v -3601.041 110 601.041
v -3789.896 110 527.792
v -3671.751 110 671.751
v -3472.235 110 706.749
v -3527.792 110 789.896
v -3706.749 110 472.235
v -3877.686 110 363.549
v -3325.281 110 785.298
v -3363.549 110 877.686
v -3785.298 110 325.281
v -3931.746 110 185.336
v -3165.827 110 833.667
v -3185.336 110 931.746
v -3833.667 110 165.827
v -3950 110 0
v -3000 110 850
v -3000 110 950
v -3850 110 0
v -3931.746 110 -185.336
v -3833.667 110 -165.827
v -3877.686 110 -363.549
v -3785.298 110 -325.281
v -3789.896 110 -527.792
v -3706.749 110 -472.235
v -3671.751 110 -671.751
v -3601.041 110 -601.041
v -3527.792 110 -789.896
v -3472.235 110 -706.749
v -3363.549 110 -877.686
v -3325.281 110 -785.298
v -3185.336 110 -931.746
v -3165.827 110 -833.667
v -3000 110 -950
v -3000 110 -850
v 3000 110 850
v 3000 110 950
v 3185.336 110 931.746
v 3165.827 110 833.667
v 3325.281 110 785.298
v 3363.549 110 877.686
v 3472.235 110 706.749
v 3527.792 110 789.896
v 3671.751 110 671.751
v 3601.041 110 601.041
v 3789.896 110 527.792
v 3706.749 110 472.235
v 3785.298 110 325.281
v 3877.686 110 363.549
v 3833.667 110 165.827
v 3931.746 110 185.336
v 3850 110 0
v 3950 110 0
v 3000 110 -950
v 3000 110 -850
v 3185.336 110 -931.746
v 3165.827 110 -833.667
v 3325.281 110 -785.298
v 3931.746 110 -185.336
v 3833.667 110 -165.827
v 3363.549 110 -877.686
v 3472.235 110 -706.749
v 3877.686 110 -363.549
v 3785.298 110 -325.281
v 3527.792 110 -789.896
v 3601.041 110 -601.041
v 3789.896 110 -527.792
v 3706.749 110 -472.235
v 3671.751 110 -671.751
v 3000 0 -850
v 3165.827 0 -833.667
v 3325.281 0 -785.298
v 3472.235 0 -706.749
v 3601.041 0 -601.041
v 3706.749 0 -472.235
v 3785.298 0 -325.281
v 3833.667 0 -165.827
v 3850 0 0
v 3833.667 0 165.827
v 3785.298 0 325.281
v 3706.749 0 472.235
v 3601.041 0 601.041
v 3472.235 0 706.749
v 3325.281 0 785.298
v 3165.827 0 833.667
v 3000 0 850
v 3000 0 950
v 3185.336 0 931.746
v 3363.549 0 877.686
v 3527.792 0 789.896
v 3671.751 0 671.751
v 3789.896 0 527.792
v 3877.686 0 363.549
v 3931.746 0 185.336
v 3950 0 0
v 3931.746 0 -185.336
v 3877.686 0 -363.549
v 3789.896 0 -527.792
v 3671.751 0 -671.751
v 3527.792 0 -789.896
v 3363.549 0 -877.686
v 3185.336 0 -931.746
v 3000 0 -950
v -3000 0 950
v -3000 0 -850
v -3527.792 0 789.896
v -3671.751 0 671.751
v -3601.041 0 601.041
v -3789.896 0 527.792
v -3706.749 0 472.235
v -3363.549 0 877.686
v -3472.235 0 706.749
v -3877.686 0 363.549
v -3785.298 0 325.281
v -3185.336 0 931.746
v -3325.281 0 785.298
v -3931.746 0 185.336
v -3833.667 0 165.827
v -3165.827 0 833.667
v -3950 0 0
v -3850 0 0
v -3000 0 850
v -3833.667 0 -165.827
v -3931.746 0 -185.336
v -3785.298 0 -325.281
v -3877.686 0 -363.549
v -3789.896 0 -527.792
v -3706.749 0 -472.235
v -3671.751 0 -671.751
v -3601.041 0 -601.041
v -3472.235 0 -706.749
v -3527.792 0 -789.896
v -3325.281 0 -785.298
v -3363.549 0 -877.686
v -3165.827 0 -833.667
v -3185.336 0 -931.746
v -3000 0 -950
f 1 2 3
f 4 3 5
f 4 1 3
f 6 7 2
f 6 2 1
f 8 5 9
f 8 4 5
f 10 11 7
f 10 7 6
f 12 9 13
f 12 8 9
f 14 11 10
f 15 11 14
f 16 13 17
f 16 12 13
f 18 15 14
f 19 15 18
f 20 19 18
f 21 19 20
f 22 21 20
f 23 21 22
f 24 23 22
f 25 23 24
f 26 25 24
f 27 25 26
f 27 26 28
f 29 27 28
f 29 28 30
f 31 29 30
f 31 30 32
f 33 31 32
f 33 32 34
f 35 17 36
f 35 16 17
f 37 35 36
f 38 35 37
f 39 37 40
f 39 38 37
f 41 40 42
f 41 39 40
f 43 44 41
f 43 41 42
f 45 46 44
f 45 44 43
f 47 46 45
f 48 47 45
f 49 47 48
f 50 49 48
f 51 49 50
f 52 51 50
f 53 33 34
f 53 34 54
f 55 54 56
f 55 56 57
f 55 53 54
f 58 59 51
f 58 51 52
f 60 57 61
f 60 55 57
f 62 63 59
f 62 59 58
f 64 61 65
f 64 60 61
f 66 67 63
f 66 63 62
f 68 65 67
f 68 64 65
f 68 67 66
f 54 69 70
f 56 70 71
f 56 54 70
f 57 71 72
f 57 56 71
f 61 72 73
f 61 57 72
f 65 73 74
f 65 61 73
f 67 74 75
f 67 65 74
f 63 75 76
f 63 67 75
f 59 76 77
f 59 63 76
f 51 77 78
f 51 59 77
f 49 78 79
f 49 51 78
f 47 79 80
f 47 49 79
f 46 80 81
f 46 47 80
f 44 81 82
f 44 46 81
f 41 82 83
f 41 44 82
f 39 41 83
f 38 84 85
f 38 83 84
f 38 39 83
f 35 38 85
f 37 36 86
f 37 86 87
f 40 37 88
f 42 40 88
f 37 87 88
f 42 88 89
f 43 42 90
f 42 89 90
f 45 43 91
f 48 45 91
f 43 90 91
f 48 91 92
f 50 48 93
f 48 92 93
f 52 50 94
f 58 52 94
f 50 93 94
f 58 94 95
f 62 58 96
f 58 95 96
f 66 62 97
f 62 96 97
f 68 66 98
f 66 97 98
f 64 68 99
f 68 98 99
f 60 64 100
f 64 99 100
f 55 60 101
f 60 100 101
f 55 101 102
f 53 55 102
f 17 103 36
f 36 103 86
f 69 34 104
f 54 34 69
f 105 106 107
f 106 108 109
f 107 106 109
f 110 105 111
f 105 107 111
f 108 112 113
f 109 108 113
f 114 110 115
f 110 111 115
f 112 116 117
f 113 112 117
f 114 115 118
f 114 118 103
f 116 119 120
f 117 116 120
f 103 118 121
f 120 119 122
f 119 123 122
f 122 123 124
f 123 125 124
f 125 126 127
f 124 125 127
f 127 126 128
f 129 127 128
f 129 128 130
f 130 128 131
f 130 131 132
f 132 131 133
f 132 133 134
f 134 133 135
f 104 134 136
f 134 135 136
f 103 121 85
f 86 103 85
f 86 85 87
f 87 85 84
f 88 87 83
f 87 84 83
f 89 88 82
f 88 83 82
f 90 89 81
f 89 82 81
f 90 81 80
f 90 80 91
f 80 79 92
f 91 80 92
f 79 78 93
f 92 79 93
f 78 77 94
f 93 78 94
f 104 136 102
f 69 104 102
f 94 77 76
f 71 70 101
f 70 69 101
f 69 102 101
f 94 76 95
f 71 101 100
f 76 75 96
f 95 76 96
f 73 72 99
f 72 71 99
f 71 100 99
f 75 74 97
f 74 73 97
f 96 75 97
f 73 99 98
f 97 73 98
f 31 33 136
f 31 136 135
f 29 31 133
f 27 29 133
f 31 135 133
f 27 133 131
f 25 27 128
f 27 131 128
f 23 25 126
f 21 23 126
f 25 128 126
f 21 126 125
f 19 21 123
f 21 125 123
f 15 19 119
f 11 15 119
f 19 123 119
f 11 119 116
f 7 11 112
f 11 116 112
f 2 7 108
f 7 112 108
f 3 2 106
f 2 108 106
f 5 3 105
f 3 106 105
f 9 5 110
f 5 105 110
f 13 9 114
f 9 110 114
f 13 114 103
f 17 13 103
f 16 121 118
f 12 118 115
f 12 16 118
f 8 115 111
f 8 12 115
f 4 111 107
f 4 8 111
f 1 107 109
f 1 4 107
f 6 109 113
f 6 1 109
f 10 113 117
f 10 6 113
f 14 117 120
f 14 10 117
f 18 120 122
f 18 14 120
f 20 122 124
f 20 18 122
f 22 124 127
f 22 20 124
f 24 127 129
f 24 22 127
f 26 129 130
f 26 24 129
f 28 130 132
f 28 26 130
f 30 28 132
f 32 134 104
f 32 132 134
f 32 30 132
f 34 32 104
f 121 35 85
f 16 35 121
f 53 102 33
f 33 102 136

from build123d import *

# Parameters (mm, degrees)
BOSS_EXTRUDE1_DEPTH = 110
SHELL1_T            = -100
CUT_EXTRUDE1_DEPTH  = 110


with BuildPart() as part:
    # Sketch2 → Boss-Extrude1 (new body)
    with BuildSketch(Plane(origin=(0, 0, 0), x_dir=(1, 0, 0), z_dir=(0, 1, 0))):
        with BuildLine():
            Line((3000, 950), (-3000, 950))
            ThreePointArc((-3000, 950), (-3950, 0), (-3000, -950))
            Line((-3000, -950), (3000, -950))
            ThreePointArc((3000, -950), (3950, 0), (3000, 950))
        make_face()
    extrude(amount=BOSS_EXTRUDE1_DEPTH)

    # Shell1
    shell1_openings = [part.faces().sort_by_distance(p)[0] for p in [
        (0, 110, 0),
    ]]
    offset(amount=SHELL1_T, openings=shell1_openings, kind=Kind.INTERSECTION)

    # Sketch5 → Cut-Extrude1 (cut)
    with BuildSketch(Plane(origin=(0, 100, 0), x_dir=(1, 0, 0), z_dir=(0, 1, 0))):
        with BuildLine():
            Line((-3000, 850), (3000, 850))
            ThreePointArc((3000, 850), (3850, 0), (3000, -850))
            Line((3000, -850), (-3000, -850))
            ThreePointArc((-3000, -850), (-3850, 0), (-3000, 850))
        make_face()
    extrude(amount=-CUT_EXTRUDE1_DEPTH, mode=Mode.SUBTRACT)


solid = part.part
